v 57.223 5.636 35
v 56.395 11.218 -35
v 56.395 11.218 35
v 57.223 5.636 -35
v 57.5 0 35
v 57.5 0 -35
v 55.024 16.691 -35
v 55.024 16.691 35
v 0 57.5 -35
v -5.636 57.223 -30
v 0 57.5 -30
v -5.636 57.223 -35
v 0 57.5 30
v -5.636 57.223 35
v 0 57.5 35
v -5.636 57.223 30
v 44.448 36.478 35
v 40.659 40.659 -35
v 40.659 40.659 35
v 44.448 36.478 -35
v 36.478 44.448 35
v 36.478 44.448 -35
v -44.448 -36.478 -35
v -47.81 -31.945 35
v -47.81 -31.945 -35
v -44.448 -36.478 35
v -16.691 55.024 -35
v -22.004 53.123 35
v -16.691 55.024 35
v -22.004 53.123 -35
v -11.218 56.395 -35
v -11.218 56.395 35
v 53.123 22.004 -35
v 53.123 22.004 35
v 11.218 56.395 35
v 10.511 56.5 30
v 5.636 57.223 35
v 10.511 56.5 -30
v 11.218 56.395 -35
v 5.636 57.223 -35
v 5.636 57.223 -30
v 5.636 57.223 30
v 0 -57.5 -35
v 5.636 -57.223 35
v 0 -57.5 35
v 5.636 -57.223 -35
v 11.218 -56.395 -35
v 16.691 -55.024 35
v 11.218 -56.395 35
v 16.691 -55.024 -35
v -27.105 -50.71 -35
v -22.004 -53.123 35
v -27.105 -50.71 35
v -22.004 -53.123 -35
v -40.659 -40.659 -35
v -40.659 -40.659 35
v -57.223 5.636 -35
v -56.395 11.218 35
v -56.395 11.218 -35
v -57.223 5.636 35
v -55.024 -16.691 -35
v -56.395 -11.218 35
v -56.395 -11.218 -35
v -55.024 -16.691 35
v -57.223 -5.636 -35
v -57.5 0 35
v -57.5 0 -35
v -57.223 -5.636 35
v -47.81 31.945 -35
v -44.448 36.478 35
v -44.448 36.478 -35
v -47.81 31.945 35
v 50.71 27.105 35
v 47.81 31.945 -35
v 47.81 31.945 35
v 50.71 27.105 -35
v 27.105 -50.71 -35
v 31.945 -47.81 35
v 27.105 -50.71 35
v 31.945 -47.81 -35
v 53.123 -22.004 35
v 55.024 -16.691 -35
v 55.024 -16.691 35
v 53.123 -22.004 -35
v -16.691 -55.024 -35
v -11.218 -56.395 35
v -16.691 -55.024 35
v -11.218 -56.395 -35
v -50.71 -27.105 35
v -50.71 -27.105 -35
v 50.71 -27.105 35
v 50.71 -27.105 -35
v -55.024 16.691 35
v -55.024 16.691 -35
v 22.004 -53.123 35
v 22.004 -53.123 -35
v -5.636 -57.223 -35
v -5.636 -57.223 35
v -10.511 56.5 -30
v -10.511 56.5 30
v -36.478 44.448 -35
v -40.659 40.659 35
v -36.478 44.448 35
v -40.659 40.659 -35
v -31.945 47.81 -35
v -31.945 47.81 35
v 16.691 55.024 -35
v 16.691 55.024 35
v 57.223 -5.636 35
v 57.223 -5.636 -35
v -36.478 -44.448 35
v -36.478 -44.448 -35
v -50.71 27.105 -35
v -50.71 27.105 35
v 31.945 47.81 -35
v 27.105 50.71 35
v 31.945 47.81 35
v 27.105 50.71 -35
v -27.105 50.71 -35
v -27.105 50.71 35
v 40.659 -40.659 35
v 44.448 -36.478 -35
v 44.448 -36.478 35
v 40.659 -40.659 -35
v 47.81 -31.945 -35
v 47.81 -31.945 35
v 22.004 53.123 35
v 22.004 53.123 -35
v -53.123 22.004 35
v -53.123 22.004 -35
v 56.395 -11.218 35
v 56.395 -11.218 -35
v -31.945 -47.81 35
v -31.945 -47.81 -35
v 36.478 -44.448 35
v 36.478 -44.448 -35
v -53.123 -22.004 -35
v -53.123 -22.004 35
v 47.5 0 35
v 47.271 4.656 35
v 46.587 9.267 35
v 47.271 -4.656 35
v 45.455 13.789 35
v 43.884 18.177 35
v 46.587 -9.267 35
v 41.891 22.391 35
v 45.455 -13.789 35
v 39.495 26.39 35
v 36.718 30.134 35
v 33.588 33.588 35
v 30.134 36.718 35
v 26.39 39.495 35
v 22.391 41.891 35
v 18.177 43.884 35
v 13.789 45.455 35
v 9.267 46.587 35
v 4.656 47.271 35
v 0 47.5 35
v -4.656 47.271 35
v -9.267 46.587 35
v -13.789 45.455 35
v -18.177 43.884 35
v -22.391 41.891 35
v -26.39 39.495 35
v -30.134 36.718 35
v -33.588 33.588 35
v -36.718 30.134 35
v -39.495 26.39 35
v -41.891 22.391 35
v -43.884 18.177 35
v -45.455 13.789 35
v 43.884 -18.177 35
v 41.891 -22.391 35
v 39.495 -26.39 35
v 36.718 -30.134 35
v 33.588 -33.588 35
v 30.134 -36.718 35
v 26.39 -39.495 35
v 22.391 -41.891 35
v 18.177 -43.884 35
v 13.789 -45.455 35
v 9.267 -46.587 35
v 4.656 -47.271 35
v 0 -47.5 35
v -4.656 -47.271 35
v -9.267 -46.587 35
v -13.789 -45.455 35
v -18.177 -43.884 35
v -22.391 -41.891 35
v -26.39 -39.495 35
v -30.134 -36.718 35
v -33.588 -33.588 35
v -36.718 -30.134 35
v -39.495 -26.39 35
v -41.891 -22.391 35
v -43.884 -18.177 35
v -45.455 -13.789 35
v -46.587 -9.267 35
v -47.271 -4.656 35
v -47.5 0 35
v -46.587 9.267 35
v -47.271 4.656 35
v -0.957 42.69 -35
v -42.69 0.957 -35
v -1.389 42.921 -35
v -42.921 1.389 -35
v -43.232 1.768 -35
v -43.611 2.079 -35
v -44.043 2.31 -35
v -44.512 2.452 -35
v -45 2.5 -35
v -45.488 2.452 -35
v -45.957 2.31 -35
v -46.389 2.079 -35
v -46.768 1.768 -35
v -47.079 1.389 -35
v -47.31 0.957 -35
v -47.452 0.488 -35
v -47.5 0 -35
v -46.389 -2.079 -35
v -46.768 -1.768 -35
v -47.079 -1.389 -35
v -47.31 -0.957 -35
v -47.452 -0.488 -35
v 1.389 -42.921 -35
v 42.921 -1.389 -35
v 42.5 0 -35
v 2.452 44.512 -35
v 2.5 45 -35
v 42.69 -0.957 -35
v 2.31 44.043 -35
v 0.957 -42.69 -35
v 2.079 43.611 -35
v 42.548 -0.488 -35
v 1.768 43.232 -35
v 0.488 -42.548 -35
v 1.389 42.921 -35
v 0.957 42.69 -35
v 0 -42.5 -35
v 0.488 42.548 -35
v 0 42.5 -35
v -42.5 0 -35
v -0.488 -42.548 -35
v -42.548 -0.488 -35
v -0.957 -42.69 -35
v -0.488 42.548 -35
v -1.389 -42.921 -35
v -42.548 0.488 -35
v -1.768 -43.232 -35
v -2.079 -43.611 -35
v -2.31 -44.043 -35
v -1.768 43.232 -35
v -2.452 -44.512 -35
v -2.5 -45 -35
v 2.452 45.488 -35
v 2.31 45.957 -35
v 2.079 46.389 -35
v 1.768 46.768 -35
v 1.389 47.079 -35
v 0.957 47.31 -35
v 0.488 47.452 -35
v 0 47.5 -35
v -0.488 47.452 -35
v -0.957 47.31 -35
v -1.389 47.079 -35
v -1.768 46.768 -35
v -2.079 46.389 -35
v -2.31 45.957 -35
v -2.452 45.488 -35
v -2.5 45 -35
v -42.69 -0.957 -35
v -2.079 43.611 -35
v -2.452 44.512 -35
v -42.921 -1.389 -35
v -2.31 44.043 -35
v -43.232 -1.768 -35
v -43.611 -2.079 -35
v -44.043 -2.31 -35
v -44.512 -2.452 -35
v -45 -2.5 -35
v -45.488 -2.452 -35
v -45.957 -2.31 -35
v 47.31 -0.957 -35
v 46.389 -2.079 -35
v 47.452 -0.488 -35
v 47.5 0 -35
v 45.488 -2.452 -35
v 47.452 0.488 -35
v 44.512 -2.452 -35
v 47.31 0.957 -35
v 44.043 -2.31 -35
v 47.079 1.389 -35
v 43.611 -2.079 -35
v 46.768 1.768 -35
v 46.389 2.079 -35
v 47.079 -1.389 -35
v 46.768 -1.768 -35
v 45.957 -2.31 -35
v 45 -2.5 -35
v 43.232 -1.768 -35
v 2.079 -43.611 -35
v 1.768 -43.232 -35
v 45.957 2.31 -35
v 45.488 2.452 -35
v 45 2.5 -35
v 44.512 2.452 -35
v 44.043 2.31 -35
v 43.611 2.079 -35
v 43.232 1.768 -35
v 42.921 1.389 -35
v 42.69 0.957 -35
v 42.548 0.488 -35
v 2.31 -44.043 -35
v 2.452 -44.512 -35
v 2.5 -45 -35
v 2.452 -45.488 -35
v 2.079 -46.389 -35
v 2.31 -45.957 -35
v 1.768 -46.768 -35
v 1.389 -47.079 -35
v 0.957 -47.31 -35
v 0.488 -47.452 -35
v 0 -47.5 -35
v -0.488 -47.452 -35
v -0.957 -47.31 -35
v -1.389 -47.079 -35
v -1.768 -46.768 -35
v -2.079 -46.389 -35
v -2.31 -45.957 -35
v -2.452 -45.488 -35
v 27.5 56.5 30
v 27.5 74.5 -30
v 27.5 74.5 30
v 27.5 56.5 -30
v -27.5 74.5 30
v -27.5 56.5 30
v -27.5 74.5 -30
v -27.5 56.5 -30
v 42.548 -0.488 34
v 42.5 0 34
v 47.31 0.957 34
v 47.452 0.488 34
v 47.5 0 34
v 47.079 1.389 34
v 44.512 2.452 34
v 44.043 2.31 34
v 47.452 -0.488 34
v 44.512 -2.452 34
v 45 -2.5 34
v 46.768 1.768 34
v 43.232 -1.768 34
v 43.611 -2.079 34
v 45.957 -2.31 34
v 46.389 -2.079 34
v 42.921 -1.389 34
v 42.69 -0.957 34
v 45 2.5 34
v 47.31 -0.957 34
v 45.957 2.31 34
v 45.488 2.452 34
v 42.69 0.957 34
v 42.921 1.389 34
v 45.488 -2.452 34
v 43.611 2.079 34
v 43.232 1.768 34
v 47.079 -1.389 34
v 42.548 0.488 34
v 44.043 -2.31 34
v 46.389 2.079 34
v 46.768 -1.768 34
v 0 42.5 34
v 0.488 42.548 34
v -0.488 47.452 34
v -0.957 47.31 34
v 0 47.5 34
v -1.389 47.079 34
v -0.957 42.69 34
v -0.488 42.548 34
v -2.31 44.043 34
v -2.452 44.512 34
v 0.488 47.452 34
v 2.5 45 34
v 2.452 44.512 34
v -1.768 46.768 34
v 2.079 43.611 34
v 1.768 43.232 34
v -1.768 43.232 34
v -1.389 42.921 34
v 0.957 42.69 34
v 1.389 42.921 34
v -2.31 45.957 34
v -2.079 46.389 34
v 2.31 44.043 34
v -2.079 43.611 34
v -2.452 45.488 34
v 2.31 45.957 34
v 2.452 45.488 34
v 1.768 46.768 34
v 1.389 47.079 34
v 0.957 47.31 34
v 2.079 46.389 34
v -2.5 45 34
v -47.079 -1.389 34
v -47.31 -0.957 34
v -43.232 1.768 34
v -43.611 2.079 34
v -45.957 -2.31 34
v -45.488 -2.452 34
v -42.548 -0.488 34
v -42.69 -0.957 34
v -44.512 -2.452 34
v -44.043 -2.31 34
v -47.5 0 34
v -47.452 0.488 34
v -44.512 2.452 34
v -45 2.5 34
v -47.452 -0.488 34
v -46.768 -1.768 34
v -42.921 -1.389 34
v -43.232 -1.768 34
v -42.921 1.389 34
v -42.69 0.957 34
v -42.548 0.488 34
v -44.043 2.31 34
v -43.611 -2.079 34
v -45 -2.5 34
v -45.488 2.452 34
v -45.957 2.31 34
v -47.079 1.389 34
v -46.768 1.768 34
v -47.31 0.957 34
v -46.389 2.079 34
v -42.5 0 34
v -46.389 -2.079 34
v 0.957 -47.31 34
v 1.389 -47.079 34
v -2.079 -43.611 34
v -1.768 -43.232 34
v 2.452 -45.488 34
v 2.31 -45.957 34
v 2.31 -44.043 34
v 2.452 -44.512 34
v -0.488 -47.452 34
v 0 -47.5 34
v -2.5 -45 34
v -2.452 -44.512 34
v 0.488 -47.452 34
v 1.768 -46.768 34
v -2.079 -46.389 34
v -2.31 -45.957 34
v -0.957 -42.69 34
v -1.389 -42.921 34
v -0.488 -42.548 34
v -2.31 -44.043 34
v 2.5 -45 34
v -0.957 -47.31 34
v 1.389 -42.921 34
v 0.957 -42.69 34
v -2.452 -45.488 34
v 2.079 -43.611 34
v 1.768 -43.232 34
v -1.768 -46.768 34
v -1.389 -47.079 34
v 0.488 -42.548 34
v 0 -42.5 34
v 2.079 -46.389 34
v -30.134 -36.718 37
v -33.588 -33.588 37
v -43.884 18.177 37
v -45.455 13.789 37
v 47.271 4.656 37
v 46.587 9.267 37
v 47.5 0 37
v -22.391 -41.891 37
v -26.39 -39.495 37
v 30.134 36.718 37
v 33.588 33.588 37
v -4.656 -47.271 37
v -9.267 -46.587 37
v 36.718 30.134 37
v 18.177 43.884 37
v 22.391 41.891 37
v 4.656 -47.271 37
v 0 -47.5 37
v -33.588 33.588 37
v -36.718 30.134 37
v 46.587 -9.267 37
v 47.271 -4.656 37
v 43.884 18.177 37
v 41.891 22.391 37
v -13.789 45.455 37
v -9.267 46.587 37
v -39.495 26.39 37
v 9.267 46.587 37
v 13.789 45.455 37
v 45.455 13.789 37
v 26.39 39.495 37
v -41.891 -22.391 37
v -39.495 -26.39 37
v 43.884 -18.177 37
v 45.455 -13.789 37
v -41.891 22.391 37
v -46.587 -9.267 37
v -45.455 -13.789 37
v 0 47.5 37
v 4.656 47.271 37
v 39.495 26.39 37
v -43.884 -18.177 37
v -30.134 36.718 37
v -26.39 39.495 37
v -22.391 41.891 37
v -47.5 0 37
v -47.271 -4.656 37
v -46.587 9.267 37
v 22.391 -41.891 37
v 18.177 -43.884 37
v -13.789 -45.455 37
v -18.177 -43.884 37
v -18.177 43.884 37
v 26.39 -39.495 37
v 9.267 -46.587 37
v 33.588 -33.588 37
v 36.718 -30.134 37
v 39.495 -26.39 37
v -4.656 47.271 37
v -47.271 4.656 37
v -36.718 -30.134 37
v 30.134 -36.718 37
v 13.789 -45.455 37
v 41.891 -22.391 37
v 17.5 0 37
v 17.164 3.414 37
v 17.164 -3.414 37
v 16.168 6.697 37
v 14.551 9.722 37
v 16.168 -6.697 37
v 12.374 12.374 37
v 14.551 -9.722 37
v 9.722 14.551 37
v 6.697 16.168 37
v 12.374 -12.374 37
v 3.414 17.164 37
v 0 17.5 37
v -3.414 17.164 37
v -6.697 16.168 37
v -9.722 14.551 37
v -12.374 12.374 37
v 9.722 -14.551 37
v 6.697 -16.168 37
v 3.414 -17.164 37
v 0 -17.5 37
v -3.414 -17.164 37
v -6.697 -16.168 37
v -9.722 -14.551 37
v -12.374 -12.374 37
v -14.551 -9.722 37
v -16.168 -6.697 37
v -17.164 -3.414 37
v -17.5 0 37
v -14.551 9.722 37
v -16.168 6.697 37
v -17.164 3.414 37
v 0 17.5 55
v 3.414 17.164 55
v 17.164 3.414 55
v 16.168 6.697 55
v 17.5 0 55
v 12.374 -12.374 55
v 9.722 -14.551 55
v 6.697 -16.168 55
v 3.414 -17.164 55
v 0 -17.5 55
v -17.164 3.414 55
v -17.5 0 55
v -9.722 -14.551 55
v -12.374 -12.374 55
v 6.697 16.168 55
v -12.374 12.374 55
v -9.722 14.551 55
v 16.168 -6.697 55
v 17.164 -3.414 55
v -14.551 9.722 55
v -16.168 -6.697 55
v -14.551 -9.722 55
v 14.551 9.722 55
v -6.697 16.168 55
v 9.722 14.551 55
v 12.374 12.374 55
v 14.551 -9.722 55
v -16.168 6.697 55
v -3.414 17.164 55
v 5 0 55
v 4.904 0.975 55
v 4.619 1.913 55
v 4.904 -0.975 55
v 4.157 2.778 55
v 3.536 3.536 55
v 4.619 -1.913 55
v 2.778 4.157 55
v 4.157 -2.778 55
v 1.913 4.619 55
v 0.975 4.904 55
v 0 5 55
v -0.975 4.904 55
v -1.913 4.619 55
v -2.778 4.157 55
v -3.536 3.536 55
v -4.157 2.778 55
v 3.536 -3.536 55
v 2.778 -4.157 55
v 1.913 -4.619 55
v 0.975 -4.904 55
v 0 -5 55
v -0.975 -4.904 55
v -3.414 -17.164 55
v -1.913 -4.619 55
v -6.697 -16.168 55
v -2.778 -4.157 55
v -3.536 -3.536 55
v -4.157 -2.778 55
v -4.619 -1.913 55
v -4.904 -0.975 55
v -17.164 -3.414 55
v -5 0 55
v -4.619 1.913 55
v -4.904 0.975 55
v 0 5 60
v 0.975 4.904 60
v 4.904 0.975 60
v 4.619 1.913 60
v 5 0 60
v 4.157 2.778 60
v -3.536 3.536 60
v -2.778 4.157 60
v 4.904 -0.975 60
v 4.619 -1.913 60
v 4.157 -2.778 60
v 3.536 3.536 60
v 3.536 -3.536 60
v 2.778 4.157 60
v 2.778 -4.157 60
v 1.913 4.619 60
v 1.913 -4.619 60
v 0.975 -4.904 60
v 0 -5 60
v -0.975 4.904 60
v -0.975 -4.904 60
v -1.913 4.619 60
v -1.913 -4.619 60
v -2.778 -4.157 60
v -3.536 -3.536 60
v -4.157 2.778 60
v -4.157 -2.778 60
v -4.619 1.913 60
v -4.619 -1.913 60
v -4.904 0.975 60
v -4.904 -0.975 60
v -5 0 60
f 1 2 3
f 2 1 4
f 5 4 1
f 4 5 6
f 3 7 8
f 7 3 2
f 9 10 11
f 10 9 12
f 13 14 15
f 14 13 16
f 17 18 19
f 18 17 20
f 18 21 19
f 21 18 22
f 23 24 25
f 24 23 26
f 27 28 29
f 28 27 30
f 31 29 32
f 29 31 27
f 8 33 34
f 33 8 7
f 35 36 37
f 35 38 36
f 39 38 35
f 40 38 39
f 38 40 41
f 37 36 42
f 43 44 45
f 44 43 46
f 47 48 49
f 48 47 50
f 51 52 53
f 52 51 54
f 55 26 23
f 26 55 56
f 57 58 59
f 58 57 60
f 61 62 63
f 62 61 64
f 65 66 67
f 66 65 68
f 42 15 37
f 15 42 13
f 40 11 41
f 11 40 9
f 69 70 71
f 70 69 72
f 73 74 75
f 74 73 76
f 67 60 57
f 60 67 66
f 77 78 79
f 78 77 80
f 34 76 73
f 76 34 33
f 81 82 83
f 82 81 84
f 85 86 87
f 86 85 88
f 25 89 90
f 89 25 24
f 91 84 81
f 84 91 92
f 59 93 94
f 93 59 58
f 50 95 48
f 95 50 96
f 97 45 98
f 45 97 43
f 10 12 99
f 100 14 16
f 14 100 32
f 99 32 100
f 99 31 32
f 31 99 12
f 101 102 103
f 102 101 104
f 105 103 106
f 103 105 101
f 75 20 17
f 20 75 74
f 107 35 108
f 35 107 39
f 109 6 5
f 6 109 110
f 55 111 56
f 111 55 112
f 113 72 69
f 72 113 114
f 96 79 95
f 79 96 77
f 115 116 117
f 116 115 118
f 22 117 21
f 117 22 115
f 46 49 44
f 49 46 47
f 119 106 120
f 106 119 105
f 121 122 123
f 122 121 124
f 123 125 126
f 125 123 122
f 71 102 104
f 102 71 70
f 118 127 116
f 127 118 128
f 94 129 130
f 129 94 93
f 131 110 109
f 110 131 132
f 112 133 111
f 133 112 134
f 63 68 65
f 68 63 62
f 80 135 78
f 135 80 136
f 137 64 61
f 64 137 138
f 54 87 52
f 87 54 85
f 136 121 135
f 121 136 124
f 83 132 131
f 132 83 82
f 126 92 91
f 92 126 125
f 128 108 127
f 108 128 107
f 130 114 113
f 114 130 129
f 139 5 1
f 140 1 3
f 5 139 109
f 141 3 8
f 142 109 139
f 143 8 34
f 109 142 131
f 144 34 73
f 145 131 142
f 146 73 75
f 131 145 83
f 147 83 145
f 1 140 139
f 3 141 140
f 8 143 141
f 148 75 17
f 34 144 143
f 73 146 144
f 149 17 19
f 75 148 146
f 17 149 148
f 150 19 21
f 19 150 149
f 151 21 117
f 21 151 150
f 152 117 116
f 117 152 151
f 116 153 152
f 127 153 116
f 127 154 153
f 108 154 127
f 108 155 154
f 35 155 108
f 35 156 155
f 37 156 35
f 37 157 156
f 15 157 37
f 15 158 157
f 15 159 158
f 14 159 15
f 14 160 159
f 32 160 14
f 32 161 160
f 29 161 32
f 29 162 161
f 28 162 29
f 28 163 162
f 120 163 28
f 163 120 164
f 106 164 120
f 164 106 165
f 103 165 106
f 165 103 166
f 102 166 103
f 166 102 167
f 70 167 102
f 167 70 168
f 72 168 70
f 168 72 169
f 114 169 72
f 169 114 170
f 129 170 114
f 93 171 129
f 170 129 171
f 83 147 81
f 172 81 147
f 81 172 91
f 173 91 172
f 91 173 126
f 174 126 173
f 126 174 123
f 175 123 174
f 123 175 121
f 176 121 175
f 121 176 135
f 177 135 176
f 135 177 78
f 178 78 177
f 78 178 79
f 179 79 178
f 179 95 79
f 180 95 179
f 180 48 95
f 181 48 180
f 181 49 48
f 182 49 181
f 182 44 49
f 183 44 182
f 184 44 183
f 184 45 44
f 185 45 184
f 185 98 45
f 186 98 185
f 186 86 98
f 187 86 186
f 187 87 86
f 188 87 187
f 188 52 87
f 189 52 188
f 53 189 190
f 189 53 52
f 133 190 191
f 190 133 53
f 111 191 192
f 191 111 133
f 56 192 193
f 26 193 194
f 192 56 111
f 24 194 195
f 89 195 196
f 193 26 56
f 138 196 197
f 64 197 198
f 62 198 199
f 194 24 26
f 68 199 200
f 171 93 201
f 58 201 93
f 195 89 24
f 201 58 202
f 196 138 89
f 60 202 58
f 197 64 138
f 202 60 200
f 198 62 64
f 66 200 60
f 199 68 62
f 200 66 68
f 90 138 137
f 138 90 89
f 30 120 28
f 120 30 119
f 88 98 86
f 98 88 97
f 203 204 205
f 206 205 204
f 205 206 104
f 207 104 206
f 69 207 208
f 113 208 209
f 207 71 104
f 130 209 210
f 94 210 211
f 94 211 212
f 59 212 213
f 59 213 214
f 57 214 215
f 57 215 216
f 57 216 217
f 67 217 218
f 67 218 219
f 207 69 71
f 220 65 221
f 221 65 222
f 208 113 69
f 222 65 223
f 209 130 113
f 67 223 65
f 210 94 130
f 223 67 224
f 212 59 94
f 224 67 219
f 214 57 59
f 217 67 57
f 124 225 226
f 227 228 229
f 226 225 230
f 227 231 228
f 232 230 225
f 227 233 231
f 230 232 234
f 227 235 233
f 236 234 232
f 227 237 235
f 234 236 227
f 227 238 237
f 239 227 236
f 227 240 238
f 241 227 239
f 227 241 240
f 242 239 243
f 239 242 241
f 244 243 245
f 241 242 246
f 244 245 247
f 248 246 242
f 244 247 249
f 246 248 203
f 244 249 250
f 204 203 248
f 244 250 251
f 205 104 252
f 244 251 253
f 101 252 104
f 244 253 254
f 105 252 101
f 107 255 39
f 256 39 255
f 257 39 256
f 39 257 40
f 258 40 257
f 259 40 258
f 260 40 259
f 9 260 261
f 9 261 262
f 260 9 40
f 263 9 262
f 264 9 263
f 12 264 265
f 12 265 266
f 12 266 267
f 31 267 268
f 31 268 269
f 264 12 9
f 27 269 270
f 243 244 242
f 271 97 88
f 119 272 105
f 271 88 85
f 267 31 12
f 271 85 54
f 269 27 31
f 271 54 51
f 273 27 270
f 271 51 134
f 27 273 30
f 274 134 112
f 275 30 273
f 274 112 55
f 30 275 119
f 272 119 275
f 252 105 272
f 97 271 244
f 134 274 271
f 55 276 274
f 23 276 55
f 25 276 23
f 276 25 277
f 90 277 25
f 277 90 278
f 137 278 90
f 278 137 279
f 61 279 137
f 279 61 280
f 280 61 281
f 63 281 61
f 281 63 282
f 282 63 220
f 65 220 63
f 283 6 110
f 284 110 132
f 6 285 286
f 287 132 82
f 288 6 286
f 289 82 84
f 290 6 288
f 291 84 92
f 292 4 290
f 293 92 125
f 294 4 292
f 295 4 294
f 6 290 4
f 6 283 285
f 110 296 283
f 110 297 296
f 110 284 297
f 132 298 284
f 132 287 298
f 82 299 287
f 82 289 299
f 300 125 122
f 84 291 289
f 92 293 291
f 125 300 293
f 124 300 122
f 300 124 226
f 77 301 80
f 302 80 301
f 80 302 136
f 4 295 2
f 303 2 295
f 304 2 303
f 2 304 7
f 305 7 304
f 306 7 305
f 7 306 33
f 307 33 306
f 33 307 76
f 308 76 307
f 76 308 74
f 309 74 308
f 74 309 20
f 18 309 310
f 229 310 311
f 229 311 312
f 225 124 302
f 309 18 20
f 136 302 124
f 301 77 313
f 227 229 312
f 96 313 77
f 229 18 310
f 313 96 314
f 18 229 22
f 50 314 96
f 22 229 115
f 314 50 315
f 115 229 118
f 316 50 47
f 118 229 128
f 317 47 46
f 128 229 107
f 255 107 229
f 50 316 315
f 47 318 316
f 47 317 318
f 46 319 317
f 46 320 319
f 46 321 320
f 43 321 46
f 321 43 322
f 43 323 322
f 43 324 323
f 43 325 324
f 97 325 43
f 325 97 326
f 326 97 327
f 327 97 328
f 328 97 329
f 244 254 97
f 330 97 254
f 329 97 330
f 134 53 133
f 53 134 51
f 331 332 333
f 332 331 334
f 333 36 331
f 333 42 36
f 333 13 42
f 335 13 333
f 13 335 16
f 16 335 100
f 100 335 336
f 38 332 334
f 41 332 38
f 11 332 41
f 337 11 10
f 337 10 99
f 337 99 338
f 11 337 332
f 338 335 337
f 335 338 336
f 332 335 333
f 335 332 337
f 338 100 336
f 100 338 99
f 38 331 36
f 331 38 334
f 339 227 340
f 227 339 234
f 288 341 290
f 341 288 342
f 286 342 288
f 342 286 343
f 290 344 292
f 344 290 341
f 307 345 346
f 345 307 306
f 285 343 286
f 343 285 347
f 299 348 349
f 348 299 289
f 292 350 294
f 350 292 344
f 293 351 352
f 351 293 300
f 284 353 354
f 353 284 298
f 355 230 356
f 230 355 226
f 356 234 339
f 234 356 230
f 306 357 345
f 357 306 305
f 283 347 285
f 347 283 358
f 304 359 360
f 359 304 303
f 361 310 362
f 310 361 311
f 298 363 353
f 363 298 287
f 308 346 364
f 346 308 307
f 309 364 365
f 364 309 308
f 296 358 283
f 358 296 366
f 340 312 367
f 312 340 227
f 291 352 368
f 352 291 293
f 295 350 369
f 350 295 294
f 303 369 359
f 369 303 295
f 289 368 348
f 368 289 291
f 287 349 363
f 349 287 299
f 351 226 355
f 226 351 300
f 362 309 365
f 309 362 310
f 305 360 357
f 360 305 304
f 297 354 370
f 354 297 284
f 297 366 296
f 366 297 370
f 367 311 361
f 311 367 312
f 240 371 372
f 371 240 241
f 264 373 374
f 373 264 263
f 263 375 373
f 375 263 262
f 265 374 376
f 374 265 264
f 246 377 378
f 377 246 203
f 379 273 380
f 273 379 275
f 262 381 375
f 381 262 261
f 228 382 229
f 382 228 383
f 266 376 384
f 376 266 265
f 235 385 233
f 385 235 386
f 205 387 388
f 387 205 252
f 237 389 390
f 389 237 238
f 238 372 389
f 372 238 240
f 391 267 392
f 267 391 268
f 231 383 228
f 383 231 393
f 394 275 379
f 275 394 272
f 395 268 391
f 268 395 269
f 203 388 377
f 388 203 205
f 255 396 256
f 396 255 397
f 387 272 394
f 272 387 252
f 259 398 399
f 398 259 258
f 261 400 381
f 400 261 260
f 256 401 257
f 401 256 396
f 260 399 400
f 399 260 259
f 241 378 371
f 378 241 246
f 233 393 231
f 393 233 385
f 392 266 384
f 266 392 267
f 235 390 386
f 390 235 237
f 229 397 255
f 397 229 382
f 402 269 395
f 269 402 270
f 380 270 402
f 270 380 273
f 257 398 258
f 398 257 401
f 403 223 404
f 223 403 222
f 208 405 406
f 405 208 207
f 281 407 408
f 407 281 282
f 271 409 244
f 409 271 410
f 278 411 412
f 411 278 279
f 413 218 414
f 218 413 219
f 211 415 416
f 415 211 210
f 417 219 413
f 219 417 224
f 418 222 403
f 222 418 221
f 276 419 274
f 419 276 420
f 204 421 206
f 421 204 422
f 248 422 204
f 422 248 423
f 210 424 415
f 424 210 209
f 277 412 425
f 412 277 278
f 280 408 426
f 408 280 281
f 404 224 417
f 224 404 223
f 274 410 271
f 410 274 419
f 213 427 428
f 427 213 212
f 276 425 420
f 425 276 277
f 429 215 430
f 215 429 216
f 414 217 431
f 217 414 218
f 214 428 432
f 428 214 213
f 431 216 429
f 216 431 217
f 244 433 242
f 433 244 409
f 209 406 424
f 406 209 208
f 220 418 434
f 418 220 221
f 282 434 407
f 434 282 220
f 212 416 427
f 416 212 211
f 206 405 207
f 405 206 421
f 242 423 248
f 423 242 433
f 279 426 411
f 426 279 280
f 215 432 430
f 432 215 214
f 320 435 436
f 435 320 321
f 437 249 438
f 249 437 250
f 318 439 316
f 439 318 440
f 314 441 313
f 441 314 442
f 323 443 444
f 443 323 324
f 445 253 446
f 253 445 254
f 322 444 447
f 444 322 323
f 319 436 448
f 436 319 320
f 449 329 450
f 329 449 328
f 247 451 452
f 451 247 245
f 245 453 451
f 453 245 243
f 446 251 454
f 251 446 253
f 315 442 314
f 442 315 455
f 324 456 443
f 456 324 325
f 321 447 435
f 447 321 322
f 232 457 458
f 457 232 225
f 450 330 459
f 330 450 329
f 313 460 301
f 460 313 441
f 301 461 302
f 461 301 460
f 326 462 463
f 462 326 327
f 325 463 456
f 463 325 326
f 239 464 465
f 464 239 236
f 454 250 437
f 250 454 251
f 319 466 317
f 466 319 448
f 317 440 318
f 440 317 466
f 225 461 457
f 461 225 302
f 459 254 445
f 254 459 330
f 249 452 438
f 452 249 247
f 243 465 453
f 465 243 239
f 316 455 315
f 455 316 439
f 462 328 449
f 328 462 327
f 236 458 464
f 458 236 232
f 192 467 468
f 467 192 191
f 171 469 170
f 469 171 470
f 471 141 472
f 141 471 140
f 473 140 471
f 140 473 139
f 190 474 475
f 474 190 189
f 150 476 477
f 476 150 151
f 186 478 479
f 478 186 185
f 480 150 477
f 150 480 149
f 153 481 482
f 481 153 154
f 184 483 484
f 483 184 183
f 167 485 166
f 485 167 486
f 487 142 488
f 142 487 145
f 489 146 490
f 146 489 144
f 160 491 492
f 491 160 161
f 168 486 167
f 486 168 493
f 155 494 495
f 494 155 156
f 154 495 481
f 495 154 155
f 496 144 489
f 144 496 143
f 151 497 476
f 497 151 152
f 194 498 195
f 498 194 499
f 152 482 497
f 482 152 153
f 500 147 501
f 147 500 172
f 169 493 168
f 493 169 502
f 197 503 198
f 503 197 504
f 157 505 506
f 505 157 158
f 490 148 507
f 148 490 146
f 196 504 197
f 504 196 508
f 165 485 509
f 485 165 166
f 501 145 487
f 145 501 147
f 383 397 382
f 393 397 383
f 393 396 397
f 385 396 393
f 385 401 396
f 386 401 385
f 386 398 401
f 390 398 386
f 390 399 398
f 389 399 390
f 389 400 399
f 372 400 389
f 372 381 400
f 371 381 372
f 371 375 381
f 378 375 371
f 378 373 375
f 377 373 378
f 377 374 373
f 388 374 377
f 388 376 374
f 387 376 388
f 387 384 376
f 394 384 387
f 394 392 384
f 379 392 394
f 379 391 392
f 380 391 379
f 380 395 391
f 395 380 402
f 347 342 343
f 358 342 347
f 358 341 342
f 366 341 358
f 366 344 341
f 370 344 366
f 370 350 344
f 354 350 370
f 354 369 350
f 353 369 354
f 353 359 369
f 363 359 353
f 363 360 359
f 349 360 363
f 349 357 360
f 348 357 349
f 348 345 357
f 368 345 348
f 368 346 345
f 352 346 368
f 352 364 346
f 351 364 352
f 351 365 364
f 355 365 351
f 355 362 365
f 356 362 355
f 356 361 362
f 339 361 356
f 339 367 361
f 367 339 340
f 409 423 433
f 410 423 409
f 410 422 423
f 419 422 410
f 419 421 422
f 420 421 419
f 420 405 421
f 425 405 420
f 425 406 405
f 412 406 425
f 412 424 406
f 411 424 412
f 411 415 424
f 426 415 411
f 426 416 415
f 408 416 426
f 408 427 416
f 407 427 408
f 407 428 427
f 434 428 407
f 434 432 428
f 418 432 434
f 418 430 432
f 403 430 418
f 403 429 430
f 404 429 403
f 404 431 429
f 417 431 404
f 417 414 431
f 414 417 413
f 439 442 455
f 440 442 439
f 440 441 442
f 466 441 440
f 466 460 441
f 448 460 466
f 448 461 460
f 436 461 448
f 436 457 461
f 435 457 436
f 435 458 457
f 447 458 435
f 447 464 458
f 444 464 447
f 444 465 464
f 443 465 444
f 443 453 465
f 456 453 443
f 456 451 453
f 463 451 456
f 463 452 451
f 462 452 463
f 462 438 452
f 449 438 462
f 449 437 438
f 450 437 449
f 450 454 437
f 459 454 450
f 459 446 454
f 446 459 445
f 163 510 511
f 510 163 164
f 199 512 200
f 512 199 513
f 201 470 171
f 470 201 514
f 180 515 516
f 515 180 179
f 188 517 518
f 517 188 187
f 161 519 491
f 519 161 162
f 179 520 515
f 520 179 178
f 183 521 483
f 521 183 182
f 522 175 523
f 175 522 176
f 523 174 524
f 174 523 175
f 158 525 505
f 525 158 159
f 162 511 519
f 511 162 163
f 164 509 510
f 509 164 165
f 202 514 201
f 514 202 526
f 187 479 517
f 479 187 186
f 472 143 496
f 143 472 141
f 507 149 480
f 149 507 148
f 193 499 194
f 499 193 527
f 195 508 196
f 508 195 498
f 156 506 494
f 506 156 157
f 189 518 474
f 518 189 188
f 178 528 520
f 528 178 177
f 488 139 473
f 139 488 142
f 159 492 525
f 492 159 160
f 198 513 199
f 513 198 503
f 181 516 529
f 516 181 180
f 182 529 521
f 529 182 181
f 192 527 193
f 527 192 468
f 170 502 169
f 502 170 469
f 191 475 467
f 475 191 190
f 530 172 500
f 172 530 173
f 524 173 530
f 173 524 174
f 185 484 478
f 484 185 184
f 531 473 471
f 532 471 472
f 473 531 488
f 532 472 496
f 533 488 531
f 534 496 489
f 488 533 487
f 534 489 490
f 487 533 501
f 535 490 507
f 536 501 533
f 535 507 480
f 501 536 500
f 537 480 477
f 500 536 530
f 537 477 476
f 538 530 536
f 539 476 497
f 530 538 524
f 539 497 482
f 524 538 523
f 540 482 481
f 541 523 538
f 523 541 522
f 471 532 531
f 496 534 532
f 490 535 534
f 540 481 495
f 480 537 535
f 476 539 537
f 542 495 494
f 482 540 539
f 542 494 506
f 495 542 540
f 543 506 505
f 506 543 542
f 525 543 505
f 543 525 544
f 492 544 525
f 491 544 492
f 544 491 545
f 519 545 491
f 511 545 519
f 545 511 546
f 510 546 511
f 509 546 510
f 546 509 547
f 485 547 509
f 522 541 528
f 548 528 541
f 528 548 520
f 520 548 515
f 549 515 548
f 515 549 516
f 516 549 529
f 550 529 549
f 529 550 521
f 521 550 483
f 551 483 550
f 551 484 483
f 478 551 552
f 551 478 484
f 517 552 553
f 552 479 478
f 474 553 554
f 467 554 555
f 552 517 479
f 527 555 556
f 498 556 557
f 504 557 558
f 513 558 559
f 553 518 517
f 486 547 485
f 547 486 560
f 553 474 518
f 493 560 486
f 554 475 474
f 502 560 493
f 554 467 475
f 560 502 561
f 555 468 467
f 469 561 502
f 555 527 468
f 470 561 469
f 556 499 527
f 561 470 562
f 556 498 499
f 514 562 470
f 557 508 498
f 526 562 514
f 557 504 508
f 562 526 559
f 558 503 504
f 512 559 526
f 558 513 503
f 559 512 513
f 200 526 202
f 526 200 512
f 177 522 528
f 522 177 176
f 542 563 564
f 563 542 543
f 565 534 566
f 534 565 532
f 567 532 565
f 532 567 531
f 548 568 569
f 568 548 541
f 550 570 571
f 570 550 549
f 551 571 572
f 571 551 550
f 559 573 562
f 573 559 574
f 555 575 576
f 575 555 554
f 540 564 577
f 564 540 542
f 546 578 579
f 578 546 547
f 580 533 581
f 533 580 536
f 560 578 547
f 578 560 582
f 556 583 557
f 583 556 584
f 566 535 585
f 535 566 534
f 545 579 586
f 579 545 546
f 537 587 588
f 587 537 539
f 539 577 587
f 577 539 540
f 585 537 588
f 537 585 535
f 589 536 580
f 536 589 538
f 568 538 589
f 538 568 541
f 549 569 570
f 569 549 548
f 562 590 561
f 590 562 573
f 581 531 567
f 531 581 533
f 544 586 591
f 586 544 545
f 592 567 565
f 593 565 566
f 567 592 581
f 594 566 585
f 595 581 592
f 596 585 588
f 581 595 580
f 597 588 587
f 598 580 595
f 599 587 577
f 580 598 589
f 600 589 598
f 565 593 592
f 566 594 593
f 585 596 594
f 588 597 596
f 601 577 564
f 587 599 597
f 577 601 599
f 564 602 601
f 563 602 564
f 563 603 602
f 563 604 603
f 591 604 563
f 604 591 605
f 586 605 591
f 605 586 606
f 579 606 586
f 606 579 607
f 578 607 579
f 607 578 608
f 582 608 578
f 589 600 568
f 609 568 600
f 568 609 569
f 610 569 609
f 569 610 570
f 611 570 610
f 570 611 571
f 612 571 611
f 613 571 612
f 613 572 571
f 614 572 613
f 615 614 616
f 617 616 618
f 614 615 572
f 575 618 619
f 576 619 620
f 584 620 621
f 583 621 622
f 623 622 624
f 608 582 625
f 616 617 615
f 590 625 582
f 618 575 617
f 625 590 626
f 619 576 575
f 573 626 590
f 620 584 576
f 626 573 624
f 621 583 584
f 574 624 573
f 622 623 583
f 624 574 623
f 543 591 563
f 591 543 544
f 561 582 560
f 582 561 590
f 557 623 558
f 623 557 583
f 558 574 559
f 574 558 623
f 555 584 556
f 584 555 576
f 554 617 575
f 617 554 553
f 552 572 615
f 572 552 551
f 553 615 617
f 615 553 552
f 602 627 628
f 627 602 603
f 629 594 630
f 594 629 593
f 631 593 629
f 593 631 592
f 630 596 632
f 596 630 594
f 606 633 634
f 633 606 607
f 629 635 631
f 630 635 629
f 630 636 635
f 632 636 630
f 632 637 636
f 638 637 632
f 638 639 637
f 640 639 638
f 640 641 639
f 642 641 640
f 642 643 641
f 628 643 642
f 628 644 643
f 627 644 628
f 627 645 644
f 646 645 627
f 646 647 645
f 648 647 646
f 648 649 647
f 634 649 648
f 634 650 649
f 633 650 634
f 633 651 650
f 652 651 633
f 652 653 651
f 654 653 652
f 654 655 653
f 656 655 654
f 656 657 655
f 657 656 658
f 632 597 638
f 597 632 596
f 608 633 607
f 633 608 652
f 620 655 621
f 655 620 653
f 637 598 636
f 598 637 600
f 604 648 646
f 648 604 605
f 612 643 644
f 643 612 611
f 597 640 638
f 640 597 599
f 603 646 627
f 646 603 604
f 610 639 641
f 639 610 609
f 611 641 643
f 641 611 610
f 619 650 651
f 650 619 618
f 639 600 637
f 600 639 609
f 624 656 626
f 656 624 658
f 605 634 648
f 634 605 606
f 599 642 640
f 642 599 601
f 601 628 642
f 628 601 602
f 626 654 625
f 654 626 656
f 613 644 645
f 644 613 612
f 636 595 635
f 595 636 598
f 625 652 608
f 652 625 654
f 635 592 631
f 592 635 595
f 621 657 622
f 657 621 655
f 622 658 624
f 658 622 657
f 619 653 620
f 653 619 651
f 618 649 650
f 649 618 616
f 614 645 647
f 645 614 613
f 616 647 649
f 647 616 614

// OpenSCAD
// Parameters
thickness = 3; //[1.5:6:0.5]
include_dial = 1; //[0:1:1]
include_fasteners = 0; //[0:1:1]
body_diameter = 115; //[60:230:1]
body_height = 70; //[35:140:1]
bulge_width = 55; //[28:110:1]
bulge_depth = 18; //[8:40:1]
bulge_height = 60; //[30:120:1]
shaft_diameter = 10; //[5:20:0.5]
shaft_length_above = 25; //[10:60:1]
mount_hole_diameter = 5; //[3:10:0.5]
mount_hole_radius = 45; //[25:90:1]
mount_hole_count = 4; //[3:6:1]
dial_diameter = 95; //[50:190:1]
dial_thickness = 3; //[1.5:8:0.5]
knob_diameter = 35; //[15:70:1]
knob_height = 18; //[8:40:1]
fastener_shaft_diameter = 4; //[2:8:0.5]
fastener_head_diameter = 8; //[4:16:0.5]
fastener_head_height = 3; //[1.5:8:0.5]
washer_outer_diameter = 10; //[6:20:0.5]
washer_thickness = 1.5; //[0.8:4:0.1]
overlap = 1; //[0.5:2:0.1]

// Variac Body with Bulge
module variac_body() {
  color("DimGray") {
    union() {
      // Main Body
      translate([0, 0, 0])
        cylinder(h=body_height, r=body_diameter/2, center=true, $fn=64);
      // Bulge
      translate([0, body_diameter/2 + bulge_depth/2 - overlap, 0])
        cube([bulge_width, bulge_depth, bulge_height], center=true);
    }
  }
}

// Shaft
module shaft() {
  color("Silver") {
    translate([0, 0, shaft_length_above/2])
      cylinder(h=body_height + shaft_length_above, r=shaft_diameter/2, center=true, $fn=32);
  }
}

// Mounting Holes
module mounting_holes() {
  for (i = [0:mount_hole_count-1]) {
    rotate([0, 0, i*360/mount_hole_count])
      translate([mount_hole_radius, 0, 0])
        cylinder(h=body_height + 2*overlap, r=mount_hole_diameter/2, center=true, $fn=32);
  }
}

// Dial Assembly
module dial_assembly() {
  if (include_dial) {
    color("Black") {
      union() {
        // Dial Face
        translate([0, 0, body_height/2 + dial_thickness/2 - overlap])
          cylinder(h=dial_thickness, r=dial_diameter/2, center=true, $fn=64);
        // Knob
        translate([0, 0, body_height/2 + dial_thickness - overlap + knob_height/2])
          cylinder(h=knob_height, r=knob_diameter/2, center=true, $fn=32);
      }
    }
  }
}

// Fasteners
module fasteners() {
  if (include_fasteners) {
    color("Silver") {
      for (i = [0:mount_hole_count-1]) {
        rotate([0, 0, i*360/mount_hole_count]) {
          translate([mount_hole_radius, 0, body_height/2 + (dial_thickness + washer_thickness + fastener_head_height)/2 - overlap])
            cylinder(h=dial_thickness + washer_thickness + fastener_head_height + overlap, r=fastener_shaft_diameter/2, center=true, $fn=32);
          translate([mount_hole_radius, 0, body_height/2 + dial_thickness + washer_thickness + fastener_head_height/2 - overlap])
            cylinder(h=fastener_head_height, r=fastener_head_diameter/2, center=true, $fn=32);
          translate([mount_hole_radius, 0, body_height/2 + dial_thickness + washer_thickness/2 - overlap])
            cylinder(h=washer_thickness, r=washer_outer_diameter/2, center=true, $fn=32);
        }
      }
    }
  }
}

// Complete Variac Assembly
module variac() {
  difference() {
    variac_body();
    mounting_holes();
  }
  shaft();
  dial_assembly();
  fasteners();
}

// Final Assembly
module assembly() {
  variac();
}

assembly();
